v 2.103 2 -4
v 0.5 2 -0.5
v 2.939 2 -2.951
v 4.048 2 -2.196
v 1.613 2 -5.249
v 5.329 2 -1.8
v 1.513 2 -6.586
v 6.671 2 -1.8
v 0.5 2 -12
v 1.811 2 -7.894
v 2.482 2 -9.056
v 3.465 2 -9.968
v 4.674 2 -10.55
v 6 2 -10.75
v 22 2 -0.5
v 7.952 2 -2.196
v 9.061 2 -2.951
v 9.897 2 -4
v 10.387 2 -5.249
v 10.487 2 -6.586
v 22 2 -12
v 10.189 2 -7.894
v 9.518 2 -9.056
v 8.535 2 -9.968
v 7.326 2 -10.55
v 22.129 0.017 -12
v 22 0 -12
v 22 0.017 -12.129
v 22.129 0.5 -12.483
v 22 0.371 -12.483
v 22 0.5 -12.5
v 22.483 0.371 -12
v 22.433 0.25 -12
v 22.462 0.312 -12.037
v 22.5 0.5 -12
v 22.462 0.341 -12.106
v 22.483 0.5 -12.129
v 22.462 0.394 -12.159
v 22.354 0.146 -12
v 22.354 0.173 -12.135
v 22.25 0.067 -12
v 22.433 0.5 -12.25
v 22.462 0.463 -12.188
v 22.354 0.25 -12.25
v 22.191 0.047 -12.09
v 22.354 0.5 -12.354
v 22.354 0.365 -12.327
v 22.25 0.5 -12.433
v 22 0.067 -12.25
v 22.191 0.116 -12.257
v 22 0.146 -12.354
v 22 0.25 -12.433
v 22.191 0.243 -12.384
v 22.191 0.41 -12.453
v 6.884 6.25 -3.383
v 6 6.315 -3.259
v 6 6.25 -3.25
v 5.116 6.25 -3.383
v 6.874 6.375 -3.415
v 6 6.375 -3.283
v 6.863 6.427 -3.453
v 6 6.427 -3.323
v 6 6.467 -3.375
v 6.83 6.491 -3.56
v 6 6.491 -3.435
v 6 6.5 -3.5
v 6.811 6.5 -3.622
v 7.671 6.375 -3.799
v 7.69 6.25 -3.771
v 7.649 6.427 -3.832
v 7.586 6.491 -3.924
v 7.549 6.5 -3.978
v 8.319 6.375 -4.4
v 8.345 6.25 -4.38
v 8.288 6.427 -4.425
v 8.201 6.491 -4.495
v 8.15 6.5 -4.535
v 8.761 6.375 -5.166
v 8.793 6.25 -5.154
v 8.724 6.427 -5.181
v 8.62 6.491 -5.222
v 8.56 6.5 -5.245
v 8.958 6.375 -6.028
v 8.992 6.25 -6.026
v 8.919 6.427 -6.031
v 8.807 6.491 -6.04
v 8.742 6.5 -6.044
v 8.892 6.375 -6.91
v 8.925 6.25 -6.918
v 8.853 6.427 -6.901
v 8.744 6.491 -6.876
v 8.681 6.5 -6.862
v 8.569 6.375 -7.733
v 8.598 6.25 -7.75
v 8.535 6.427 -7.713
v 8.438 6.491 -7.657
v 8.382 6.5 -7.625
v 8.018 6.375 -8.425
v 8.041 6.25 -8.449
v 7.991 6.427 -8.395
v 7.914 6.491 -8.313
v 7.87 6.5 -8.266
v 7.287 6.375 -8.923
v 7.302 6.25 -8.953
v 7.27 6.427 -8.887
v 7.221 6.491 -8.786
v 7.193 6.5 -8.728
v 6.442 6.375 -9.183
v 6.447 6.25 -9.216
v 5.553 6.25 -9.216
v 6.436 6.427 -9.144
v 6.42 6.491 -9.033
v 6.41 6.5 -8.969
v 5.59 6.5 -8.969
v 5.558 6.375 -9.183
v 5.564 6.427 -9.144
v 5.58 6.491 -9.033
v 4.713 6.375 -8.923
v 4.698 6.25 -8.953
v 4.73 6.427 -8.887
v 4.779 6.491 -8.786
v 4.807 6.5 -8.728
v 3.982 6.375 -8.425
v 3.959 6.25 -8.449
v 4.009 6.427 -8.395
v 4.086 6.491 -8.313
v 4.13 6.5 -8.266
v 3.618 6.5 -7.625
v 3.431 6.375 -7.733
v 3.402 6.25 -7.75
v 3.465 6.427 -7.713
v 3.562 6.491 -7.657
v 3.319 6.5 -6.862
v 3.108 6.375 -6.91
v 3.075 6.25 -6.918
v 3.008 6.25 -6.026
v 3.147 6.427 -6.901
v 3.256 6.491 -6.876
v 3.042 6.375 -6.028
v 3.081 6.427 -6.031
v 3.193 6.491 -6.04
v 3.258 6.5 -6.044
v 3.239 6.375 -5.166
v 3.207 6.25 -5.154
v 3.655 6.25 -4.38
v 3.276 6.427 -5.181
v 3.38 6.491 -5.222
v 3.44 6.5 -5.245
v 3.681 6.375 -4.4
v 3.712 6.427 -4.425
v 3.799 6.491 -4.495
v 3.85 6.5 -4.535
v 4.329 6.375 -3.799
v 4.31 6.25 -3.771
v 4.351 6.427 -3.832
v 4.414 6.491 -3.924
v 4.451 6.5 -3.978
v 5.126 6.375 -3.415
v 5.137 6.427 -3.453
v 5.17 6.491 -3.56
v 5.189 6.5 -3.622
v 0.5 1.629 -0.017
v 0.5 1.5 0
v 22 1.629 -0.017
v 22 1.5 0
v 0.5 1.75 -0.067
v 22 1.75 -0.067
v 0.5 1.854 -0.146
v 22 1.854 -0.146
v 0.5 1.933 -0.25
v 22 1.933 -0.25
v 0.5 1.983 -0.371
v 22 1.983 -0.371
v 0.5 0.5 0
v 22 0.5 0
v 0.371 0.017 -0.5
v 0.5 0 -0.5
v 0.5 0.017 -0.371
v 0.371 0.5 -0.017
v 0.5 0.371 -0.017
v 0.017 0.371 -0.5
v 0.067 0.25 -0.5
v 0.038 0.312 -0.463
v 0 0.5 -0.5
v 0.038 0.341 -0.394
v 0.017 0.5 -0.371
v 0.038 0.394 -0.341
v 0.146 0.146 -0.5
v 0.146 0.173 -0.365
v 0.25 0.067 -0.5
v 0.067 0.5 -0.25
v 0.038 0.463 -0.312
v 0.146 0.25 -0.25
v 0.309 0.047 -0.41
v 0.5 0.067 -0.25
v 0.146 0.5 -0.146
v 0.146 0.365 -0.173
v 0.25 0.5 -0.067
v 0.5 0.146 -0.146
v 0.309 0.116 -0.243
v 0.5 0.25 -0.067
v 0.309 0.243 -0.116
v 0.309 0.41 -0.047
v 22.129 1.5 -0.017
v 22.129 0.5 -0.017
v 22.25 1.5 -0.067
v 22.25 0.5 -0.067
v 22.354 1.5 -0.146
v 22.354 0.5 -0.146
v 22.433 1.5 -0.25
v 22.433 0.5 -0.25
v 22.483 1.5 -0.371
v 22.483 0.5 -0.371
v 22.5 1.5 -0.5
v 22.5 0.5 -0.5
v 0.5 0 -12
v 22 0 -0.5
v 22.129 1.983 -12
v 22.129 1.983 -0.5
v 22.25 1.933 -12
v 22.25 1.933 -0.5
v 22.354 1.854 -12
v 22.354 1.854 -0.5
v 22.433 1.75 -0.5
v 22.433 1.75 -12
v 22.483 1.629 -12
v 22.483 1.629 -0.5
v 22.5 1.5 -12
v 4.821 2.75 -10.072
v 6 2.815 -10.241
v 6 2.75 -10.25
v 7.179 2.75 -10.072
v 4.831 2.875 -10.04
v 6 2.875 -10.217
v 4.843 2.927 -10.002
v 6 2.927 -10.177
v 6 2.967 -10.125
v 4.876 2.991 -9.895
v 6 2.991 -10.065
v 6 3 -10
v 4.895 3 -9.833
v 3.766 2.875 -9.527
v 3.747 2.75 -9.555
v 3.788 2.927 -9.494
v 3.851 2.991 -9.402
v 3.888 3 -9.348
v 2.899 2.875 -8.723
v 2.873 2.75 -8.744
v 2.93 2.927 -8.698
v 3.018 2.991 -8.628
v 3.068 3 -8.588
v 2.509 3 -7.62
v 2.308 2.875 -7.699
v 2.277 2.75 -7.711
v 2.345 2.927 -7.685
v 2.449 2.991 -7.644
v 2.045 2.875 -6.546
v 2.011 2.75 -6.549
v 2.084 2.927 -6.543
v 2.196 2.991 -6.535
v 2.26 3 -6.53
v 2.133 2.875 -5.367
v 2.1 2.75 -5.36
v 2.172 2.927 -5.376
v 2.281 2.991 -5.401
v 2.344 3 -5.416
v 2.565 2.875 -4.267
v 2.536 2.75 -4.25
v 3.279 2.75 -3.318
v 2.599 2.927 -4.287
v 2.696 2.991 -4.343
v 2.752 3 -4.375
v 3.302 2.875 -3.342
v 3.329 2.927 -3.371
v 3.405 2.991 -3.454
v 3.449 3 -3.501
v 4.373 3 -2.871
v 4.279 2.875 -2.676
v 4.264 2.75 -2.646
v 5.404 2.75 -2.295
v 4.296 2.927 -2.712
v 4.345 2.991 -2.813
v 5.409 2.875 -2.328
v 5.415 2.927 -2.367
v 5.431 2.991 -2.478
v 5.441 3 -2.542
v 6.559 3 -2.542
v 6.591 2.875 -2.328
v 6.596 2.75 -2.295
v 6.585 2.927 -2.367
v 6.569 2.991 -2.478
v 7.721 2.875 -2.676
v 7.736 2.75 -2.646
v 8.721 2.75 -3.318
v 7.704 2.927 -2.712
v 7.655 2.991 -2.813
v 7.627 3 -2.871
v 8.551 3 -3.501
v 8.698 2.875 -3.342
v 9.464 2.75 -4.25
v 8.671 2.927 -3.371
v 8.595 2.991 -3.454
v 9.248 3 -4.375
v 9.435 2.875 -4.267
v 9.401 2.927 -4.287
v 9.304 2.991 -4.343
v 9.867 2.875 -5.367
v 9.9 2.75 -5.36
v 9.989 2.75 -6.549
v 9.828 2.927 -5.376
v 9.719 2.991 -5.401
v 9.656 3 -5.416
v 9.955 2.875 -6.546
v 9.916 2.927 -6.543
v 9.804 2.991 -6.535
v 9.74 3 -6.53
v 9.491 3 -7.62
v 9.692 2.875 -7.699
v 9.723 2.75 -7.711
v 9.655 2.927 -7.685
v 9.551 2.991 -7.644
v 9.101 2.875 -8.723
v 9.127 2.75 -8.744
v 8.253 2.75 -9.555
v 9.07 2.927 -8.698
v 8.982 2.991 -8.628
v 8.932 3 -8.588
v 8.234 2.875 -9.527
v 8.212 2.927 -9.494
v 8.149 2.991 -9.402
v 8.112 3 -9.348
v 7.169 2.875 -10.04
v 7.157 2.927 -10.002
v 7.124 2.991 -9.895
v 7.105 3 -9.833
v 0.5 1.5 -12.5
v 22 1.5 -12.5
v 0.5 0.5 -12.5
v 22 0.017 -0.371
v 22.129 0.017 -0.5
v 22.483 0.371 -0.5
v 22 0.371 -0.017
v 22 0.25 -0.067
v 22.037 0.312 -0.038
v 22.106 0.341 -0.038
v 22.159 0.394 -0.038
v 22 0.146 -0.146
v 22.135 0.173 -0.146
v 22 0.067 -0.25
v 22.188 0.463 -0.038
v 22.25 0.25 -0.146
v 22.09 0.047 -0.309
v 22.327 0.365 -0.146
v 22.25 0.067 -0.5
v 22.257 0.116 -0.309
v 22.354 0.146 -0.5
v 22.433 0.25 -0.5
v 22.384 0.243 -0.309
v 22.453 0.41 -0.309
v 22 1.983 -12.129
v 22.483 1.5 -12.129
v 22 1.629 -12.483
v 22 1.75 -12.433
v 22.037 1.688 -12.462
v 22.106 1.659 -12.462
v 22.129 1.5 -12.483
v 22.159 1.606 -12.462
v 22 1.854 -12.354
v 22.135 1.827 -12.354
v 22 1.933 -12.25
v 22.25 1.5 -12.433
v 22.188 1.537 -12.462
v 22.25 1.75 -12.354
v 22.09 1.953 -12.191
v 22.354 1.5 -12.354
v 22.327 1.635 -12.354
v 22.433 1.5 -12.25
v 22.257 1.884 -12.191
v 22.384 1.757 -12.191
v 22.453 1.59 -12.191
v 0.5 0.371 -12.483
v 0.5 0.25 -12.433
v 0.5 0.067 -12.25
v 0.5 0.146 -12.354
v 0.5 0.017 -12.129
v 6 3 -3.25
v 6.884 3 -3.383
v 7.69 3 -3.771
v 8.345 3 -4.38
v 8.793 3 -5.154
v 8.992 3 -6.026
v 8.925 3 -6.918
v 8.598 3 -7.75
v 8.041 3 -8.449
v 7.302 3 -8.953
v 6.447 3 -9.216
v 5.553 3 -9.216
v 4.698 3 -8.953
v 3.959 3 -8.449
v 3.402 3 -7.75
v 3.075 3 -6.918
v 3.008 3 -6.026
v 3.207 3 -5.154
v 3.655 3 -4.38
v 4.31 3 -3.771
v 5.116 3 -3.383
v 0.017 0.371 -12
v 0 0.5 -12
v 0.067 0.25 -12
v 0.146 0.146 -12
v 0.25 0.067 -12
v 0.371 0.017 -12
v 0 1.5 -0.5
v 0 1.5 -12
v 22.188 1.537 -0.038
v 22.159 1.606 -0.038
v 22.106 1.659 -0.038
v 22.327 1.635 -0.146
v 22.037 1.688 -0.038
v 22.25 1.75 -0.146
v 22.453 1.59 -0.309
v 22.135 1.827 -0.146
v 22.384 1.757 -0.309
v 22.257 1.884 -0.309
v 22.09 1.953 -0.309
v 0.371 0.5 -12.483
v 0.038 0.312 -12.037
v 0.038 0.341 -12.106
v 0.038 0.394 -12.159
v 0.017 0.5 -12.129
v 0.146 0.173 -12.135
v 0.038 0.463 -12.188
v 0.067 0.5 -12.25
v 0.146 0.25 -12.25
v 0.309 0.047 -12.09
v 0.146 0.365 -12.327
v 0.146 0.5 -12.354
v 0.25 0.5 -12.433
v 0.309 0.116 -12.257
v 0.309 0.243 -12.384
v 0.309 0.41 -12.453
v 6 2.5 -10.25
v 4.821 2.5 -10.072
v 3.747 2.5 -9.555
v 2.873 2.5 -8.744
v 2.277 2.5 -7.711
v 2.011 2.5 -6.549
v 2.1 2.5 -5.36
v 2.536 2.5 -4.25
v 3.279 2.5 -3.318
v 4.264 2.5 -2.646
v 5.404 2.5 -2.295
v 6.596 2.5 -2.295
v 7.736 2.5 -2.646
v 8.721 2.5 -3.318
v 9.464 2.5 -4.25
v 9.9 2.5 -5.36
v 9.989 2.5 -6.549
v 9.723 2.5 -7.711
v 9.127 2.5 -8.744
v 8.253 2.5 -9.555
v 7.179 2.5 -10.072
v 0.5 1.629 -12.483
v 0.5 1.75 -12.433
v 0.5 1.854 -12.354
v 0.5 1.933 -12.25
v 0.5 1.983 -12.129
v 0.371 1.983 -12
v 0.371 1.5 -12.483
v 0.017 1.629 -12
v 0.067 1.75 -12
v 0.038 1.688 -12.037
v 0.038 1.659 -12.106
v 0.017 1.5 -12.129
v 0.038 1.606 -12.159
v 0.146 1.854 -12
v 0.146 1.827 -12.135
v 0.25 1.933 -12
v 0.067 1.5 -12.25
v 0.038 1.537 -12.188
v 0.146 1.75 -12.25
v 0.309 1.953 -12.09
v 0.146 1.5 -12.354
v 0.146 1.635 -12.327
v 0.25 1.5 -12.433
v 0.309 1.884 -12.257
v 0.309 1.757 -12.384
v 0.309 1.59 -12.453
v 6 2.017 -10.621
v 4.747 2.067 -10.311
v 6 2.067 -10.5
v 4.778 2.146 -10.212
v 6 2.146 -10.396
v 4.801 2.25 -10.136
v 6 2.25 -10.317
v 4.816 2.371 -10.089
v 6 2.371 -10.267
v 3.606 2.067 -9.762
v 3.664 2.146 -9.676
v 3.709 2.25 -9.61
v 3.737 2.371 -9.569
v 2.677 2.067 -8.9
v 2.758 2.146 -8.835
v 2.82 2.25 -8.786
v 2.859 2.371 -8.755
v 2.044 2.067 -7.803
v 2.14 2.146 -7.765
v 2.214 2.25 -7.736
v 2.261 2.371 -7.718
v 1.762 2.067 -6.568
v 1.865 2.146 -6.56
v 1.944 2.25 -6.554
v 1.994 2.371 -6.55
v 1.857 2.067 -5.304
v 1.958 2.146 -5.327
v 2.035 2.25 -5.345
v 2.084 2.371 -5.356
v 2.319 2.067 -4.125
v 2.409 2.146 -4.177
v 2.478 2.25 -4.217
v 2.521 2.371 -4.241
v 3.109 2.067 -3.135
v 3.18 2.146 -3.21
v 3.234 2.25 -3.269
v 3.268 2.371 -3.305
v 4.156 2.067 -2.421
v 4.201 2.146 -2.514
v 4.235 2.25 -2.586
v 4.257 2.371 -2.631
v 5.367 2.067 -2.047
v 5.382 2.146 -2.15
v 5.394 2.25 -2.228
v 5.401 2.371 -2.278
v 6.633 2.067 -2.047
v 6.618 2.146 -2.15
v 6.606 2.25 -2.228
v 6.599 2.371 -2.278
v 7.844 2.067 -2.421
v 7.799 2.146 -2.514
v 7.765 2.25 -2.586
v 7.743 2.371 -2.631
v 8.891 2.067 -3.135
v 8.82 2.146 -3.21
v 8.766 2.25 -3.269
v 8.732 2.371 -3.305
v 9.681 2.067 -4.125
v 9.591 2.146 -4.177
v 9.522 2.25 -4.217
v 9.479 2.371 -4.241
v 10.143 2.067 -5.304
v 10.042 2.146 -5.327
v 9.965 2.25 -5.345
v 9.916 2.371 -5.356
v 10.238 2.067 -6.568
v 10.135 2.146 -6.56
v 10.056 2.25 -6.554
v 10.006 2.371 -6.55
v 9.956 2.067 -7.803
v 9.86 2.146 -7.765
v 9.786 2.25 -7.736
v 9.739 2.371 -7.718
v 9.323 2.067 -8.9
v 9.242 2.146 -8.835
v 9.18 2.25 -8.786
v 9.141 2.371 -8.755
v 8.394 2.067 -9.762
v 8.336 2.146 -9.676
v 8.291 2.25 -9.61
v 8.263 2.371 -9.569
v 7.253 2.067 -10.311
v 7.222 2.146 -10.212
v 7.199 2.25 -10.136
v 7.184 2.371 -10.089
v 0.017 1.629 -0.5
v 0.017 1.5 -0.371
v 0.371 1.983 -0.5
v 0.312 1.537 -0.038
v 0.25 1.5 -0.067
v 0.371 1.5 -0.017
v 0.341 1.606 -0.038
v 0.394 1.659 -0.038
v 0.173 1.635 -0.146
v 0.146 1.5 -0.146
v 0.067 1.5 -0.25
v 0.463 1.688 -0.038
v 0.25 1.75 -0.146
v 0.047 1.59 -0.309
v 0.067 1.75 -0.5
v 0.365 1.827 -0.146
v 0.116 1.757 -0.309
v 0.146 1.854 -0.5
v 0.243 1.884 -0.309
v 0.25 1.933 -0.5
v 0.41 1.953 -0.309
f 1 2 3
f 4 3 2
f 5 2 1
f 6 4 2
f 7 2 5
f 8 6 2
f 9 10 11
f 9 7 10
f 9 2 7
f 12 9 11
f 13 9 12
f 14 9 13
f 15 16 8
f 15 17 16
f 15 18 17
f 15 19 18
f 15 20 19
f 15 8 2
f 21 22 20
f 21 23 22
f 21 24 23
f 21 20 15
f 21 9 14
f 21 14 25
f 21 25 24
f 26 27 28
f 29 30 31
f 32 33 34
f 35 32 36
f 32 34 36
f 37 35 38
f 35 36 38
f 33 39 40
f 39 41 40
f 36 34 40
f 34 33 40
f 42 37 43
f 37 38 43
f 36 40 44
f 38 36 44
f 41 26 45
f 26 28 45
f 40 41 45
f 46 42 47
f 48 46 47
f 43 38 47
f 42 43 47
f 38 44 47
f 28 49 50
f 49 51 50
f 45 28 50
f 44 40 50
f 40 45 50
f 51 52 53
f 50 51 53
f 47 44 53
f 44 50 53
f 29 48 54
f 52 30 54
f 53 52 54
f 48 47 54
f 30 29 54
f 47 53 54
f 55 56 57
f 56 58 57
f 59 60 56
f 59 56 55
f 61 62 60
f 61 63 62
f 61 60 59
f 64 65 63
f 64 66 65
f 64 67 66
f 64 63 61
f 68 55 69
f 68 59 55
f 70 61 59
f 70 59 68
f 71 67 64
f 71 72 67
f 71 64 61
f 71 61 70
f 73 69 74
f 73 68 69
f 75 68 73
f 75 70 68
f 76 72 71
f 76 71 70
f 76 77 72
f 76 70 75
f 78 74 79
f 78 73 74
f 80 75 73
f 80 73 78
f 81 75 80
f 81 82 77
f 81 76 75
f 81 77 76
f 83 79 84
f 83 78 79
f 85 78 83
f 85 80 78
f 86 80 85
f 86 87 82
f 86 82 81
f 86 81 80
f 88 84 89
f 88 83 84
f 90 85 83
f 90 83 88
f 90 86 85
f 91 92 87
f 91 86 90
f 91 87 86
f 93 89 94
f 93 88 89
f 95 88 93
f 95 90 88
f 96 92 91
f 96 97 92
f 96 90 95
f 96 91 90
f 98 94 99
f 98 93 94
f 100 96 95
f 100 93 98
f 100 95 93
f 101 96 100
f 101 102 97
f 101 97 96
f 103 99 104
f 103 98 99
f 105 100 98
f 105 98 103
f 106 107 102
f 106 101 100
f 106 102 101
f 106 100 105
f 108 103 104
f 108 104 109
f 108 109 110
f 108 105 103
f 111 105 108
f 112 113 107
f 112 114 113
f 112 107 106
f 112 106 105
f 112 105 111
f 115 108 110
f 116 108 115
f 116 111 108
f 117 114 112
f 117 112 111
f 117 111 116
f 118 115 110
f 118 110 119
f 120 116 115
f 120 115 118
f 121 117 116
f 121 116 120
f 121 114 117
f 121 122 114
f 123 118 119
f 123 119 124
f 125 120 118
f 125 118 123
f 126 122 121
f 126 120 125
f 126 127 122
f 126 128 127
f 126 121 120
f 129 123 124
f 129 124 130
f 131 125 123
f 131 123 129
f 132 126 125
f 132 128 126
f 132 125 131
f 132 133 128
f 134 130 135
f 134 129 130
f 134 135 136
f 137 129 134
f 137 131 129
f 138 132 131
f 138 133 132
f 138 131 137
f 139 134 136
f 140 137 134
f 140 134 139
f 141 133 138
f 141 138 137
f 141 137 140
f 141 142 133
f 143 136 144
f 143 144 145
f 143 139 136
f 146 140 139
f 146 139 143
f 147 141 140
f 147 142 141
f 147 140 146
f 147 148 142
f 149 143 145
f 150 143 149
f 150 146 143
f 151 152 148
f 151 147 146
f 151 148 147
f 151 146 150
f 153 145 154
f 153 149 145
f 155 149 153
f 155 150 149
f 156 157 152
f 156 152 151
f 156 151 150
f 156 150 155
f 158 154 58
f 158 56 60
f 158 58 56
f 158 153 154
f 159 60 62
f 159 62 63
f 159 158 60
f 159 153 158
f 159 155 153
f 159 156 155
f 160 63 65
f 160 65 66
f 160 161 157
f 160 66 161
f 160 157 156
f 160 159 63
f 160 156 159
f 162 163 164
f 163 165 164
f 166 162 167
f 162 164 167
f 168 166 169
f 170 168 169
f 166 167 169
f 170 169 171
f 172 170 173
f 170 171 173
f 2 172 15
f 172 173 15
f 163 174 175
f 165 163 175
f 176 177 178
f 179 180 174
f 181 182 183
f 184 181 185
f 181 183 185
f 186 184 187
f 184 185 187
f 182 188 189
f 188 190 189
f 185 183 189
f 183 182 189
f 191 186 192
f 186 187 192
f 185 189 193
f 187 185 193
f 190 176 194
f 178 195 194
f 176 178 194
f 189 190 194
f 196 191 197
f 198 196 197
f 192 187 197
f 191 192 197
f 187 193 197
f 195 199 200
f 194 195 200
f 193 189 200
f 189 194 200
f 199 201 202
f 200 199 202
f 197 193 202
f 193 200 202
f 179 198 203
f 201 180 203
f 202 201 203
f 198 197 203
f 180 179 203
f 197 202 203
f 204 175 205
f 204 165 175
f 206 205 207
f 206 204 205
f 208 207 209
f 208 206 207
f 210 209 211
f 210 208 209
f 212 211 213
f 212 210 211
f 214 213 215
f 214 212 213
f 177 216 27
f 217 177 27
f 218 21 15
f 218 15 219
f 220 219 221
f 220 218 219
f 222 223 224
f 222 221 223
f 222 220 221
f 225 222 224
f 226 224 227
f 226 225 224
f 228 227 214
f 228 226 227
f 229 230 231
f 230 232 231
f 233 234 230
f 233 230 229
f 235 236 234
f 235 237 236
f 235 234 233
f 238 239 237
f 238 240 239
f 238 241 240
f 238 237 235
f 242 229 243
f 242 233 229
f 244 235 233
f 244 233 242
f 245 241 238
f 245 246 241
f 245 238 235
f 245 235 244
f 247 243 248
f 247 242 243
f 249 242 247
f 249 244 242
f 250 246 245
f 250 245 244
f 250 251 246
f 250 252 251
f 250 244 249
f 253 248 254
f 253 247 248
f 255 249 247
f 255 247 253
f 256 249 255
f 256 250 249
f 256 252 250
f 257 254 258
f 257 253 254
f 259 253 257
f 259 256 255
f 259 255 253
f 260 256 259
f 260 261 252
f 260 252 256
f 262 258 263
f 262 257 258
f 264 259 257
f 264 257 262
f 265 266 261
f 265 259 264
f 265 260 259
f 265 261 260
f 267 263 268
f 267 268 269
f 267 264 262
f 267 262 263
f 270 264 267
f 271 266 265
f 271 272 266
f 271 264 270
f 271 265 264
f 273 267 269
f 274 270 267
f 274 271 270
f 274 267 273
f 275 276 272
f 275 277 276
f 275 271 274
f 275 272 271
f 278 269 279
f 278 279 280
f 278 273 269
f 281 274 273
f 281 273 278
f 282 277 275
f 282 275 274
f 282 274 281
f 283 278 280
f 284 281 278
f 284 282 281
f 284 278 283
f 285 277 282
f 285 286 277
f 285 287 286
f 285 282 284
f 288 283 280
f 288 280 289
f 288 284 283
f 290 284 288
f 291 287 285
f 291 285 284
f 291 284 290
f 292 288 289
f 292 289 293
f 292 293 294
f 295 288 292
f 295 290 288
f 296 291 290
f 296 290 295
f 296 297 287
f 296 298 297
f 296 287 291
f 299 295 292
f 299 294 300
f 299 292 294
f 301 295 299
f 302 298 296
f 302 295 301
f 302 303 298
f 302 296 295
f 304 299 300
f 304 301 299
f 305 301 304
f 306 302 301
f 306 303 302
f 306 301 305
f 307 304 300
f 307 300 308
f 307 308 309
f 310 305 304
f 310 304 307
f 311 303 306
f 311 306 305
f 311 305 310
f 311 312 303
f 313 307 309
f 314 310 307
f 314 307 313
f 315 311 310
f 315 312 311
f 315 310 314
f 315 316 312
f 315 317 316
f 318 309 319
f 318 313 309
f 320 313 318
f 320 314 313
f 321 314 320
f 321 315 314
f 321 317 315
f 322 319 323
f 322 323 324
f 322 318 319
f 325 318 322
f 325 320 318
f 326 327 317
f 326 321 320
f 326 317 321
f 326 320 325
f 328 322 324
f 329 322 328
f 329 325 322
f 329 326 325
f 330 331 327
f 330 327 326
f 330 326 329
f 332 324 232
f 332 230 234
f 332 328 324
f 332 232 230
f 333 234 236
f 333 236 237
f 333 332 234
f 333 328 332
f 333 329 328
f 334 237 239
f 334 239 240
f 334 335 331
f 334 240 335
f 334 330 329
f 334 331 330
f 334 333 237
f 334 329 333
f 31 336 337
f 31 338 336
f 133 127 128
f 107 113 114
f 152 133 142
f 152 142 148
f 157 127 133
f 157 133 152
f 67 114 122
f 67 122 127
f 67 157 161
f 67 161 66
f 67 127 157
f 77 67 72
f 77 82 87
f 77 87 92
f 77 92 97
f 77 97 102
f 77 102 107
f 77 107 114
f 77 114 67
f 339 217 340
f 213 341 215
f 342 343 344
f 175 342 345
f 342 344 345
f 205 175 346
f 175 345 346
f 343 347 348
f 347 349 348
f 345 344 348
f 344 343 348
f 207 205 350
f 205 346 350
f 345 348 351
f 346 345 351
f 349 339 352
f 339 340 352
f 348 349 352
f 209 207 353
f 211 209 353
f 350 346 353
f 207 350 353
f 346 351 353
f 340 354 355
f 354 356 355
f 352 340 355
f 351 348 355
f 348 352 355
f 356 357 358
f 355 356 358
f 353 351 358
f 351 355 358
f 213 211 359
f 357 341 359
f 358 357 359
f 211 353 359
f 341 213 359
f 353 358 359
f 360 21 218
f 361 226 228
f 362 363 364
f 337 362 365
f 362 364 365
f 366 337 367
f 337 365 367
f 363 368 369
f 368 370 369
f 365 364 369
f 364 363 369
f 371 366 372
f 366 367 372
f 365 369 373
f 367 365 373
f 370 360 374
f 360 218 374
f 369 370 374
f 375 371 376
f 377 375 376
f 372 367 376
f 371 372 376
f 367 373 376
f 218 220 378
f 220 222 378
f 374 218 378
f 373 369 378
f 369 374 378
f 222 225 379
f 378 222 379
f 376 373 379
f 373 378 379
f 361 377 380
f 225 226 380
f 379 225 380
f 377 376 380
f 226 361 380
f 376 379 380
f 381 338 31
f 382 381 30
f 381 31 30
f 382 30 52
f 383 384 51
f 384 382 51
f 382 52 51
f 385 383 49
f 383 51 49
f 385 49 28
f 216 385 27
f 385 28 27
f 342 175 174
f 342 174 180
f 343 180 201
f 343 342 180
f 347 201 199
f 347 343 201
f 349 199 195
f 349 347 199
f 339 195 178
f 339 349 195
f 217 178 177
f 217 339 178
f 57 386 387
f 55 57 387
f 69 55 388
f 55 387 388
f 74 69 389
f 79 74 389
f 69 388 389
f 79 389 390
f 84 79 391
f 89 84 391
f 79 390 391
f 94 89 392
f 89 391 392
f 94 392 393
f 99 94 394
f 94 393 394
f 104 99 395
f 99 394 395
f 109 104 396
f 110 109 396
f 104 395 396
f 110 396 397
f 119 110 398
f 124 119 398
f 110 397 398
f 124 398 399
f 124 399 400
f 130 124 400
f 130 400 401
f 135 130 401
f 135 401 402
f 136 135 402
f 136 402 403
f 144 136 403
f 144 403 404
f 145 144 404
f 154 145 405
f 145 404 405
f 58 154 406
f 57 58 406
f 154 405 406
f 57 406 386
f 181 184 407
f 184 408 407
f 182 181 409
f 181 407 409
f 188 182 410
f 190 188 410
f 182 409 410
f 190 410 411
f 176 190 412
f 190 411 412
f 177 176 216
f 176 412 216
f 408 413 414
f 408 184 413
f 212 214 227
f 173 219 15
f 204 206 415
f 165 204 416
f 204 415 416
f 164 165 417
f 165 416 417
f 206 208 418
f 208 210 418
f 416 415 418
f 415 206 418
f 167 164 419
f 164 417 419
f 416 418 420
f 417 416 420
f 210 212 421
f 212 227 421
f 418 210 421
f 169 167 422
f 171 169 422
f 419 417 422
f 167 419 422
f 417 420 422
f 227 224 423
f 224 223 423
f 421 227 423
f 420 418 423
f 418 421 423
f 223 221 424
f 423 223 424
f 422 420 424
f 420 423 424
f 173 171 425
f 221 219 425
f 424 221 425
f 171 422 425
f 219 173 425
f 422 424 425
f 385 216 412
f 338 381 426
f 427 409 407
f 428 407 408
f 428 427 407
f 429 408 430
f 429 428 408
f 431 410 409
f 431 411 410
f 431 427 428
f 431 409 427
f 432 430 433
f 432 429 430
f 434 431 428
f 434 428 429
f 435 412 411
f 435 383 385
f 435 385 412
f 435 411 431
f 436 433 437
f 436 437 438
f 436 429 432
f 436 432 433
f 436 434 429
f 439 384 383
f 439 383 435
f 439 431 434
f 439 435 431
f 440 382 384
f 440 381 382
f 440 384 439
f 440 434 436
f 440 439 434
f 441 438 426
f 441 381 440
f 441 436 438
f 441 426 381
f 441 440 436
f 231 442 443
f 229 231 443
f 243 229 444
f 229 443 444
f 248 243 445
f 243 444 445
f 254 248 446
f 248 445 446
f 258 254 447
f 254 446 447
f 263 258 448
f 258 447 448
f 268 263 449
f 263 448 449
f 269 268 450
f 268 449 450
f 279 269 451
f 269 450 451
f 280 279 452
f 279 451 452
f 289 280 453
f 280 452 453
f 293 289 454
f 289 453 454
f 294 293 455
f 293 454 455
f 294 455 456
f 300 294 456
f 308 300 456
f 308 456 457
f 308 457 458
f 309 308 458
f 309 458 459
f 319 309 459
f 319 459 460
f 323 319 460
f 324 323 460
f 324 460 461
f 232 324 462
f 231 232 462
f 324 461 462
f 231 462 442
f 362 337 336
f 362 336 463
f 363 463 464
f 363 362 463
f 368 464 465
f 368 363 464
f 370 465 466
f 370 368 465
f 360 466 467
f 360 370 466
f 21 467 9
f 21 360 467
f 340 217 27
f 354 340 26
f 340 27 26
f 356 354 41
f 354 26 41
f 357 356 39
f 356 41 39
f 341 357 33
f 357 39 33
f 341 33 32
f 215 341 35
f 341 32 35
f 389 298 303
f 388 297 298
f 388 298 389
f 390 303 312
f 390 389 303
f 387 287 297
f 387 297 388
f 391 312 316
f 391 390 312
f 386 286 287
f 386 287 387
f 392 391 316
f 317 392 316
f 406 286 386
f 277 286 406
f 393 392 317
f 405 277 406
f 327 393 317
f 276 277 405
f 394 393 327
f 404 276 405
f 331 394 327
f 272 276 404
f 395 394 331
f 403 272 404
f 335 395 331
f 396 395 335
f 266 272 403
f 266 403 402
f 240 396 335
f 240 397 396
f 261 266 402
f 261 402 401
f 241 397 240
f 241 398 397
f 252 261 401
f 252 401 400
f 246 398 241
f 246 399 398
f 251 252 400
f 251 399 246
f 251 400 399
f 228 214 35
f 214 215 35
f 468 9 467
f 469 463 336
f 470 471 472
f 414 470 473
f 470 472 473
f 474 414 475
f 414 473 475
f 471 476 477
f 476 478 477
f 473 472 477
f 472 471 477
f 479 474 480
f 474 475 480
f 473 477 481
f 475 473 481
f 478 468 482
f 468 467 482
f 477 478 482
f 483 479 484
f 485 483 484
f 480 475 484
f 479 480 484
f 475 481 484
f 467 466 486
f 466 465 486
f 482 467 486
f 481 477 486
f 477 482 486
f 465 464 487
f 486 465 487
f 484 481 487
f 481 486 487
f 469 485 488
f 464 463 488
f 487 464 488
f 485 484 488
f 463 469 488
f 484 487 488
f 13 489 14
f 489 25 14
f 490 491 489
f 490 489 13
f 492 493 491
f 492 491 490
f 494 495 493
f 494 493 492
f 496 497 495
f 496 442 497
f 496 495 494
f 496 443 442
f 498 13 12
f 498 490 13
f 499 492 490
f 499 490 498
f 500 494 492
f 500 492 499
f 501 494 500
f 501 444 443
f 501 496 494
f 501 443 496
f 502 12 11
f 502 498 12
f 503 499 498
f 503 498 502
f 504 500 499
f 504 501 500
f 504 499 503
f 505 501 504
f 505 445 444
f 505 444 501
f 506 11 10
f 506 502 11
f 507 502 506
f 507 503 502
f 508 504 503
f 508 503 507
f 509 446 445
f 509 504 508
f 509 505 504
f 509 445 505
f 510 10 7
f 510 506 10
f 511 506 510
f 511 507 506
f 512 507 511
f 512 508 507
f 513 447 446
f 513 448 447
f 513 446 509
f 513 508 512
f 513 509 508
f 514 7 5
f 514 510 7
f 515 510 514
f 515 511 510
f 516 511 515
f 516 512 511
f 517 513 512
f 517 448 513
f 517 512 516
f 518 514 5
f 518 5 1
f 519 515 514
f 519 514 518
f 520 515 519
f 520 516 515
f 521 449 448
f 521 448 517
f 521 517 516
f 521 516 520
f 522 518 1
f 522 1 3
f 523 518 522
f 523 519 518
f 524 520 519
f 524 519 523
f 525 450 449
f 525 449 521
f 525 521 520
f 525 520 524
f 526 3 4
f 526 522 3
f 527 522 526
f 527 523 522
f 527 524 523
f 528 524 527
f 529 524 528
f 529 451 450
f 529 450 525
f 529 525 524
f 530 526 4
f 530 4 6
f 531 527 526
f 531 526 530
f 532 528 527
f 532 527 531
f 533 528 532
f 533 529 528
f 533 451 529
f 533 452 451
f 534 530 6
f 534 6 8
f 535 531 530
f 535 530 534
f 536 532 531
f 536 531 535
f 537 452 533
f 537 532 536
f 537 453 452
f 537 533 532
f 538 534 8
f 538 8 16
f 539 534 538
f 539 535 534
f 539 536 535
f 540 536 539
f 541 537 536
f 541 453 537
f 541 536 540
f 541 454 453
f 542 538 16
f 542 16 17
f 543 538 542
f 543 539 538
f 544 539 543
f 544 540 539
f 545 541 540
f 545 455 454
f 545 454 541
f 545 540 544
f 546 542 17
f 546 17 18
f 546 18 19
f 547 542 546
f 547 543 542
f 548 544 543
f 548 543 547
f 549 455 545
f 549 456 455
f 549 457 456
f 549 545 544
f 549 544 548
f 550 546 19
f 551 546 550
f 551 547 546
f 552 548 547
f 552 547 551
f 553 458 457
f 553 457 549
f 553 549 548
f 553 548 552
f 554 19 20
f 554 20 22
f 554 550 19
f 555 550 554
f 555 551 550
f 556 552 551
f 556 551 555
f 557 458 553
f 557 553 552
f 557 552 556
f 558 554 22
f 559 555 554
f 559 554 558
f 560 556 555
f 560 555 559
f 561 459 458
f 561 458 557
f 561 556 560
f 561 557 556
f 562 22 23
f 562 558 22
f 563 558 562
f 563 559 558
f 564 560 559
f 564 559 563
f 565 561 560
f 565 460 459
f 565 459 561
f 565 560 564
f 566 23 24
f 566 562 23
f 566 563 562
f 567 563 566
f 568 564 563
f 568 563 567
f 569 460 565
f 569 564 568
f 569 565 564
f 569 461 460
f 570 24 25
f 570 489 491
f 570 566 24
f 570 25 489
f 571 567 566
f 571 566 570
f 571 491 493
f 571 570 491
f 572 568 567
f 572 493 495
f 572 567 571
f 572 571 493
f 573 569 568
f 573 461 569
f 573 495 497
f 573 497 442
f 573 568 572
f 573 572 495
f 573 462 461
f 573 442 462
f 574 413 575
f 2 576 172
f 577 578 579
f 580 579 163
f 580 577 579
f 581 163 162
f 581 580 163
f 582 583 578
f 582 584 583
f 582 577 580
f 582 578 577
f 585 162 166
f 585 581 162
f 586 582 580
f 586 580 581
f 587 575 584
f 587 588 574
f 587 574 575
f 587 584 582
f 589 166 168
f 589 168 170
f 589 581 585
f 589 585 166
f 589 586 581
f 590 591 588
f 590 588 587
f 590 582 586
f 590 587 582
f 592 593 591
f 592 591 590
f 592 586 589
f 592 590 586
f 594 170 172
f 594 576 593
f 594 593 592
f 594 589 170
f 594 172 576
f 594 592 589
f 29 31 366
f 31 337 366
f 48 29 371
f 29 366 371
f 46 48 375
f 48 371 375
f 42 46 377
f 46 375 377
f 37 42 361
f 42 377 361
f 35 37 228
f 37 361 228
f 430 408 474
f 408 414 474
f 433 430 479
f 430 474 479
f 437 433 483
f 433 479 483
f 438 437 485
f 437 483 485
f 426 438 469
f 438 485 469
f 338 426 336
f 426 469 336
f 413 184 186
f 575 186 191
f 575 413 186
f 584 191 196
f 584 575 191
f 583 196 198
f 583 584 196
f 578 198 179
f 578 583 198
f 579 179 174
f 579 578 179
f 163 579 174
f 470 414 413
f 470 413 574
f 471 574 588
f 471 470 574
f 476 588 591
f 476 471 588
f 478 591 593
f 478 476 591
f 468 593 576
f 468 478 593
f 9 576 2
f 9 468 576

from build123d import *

# Parameters (mm, degrees)
SKETCH_1_W      = 22.5
SKETCH_1_H      = 12.5
EXTRUDE_1_DEPTH = 2
SKETCH_2_R      = 4
EXTRUDE_2_DEPTH = 1
SKETCH_3_R      = 3
EXTRUDE_3_DEPTH = 3.5
FILLET_1_R      = 0.5
FILLET_2_R      = 0.25


with BuildPart() as part:
    # 草图1 → 凸台-拉伸1 (new body)
    with BuildSketch(Plane(origin=(0, 0, 0), x_dir=(1, 0, 0), z_dir=(0, 1, 0))):
        with Locations((11.25, 6.25)):
            Rectangle(SKETCH_1_W, SKETCH_1_H)
    extrude(amount=EXTRUDE_1_DEPTH)

    # 草图2 → 凸台-拉伸2 (add)
    with BuildSketch(Plane(origin=(0, 2, 0), x_dir=(1, 0, 0), z_dir=(0, 1, 0))):
        with Locations(Location((6, 6.25, 0), (0, 0, 90))):
            Circle(SKETCH_2_R)
    extrude(amount=EXTRUDE_2_DEPTH)

    # 草图3 → 凸台-拉伸3 (add)
    with BuildSketch(Plane(origin=(0, 3, 0), x_dir=(1, 0, 0), z_dir=(0, 1, 0))):
        with Locations(Location((6, 6.25, 0), (0, 0, 270))):
            Circle(SKETCH_3_R)
    extrude(amount=EXTRUDE_3_DEPTH)

    # 圆角1
    fillet_1_edges = [part.edges().sort_by_distance(p)[0] for p in [
        (22.5, 2, -6.25),
        (6, 2, -2.25),
        (11.25, 2, -12.5),
        (0, 2, -6.25),
        (11.25, 0, -12.5),
        (22.5, 0, -6.25),
        (11.25, 0, 0),
        (0, 0, -6.25),
        (0, 1, -12.5),
        (22.5, 1, -12.5),
        (22.5, 1, 0),
        (0, 1, 0),
        (11.25, 2, 0),
    ]]
    fillet(fillet_1_edges, radius=FILLET_1_R)

    # 圆角2
    fillet_2_edges = [part.edges().sort_by_distance(p)[0] for p in [
        (6, 3, -2.25),
        (6, 6.5, -9.25),
    ]]
    fillet(fillet_2_edges, radius=FILLET_2_R)


solid = part.part
